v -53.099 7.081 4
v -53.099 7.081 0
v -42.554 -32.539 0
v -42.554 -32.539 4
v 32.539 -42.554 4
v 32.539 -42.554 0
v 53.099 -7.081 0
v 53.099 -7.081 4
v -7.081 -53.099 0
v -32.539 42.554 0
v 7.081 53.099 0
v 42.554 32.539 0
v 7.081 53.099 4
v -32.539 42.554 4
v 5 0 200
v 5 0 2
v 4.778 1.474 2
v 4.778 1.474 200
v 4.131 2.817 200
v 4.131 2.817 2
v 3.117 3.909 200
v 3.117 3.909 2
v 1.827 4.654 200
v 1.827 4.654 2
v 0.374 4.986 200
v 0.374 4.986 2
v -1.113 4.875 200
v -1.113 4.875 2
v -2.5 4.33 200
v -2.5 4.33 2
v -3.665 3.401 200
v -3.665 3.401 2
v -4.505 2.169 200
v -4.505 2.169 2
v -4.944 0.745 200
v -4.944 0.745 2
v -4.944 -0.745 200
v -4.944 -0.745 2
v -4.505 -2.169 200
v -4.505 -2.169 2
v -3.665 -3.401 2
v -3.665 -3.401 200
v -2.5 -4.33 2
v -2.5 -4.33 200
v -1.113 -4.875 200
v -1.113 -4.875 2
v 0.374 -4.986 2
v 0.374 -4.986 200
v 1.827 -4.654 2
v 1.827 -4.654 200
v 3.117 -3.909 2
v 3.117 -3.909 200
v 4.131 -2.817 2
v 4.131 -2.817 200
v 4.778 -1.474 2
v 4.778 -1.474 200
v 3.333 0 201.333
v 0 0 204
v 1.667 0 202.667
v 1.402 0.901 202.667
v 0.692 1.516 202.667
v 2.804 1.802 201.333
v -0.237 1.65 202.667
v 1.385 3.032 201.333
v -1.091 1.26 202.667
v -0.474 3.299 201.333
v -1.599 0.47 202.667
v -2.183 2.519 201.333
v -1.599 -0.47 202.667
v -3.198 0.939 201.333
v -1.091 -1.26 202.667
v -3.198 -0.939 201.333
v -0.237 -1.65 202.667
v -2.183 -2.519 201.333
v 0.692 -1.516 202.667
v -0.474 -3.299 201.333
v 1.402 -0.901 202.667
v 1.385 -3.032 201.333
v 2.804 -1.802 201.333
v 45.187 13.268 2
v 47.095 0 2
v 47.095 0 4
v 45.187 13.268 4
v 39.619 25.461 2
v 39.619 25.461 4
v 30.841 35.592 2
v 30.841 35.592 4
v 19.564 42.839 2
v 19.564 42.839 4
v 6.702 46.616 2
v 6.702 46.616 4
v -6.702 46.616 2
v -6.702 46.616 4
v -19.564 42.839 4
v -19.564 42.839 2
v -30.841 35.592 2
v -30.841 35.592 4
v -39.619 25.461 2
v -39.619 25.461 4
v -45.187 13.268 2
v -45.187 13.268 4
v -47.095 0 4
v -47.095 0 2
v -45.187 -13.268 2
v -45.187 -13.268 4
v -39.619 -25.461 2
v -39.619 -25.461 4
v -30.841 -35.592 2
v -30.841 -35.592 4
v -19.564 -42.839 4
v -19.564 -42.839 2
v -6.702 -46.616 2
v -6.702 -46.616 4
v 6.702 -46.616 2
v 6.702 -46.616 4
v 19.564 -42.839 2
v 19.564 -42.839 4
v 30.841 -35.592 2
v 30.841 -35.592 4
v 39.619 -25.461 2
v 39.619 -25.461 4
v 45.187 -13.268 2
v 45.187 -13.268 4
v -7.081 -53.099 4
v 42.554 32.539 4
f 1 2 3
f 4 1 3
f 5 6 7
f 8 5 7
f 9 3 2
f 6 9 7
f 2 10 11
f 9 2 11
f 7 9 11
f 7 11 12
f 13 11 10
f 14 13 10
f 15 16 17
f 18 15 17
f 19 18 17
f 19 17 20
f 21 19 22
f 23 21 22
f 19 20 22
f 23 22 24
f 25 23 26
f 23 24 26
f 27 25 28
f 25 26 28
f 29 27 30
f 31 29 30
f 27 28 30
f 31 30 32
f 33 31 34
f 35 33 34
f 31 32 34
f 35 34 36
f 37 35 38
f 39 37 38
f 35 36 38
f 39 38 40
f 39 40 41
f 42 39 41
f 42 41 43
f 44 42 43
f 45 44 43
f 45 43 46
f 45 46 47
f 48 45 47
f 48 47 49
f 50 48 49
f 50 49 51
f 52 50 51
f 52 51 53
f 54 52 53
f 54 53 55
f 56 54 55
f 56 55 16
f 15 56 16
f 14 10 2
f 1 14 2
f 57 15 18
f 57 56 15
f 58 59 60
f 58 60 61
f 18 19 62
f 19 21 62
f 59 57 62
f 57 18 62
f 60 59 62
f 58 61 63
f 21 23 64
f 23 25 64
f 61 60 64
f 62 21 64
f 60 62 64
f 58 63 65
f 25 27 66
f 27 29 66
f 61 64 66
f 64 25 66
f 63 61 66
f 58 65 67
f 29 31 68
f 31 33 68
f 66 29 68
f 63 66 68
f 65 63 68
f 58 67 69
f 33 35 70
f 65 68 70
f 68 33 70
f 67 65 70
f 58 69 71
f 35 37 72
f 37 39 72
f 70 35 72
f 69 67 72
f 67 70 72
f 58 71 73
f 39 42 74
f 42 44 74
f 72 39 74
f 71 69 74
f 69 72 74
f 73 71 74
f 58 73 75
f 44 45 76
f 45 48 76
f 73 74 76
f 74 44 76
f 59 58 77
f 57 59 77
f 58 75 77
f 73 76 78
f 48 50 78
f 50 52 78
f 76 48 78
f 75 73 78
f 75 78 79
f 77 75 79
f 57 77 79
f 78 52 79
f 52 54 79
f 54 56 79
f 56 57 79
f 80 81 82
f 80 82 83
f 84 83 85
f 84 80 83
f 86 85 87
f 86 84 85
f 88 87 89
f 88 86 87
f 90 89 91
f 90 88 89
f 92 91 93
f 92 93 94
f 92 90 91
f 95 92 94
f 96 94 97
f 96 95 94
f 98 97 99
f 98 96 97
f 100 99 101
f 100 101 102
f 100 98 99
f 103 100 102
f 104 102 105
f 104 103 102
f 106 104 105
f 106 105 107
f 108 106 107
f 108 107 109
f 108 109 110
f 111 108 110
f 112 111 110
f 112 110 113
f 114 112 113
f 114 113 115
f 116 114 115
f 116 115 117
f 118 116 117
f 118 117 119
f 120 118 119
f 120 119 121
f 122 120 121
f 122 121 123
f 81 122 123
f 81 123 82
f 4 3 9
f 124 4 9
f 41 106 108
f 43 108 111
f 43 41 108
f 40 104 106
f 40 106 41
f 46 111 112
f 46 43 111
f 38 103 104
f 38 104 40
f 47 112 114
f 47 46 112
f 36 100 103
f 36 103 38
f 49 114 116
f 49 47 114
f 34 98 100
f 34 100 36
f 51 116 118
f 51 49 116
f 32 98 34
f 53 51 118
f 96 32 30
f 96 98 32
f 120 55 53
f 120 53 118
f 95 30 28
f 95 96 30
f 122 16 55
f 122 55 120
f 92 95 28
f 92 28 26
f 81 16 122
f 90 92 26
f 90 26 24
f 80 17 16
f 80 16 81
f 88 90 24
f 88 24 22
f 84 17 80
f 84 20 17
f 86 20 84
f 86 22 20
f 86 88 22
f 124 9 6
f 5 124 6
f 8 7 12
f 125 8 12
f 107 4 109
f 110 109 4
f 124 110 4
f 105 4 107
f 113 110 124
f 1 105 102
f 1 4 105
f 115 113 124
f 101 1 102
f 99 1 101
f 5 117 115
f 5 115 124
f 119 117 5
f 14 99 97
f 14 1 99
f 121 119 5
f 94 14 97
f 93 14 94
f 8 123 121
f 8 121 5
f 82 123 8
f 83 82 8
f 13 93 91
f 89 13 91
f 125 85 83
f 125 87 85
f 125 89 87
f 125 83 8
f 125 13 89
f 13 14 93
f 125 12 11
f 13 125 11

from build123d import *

# Parameters (mm, degrees)
F0_R      = 5
F1_DEPTH  = 200
F0_R_2    = 47.095
F2_DEPTH  = 2
F3_DEPTH  = 4
F1_FACE_R = 5


with BuildPart() as f1:
    # F0 (on Top) → F1 (new body)
    with BuildSketch(Plane.XY):
        Circle(F0_R)
    extrude(amount=F1_DEPTH)

    # F0 (on Top) → F2 (join)
    with BuildSketch(Plane.XY):
        Circle(F0_R_2)
        Circle(F0_R, mode=Mode.SUBTRACT)
    extrude(amount=F2_DEPTH)

    # F0 (on Top) → F3 (join)
    with BuildSketch(Plane.XY):
        Polygon((-32.5393686004, 42.5539186241), (-53.098972618, 7.0813562323), (-42.5539186241, -32.5393686004), (-7.0813562323, -53.098972618), (32.5393686004, -42.5539186241), (53.098972618, -7.0813562323), (42.5539186241, 32.5393686004), (7.0813562323, 53.098972618), align=None)
        Circle(F0_R_2, mode=Mode.SUBTRACT)
    extrude(amount=F3_DEPTH)

    # F1_face (on face) → F6 section 0
    with BuildSketch(Plane.XY.offset(200), mode=Mode.PRIVATE) as f6_s0:
        Circle(F1_FACE_R)
    loft([Vertex(0, 0, 204), f6_s0.sketch])


solid = f1.part
